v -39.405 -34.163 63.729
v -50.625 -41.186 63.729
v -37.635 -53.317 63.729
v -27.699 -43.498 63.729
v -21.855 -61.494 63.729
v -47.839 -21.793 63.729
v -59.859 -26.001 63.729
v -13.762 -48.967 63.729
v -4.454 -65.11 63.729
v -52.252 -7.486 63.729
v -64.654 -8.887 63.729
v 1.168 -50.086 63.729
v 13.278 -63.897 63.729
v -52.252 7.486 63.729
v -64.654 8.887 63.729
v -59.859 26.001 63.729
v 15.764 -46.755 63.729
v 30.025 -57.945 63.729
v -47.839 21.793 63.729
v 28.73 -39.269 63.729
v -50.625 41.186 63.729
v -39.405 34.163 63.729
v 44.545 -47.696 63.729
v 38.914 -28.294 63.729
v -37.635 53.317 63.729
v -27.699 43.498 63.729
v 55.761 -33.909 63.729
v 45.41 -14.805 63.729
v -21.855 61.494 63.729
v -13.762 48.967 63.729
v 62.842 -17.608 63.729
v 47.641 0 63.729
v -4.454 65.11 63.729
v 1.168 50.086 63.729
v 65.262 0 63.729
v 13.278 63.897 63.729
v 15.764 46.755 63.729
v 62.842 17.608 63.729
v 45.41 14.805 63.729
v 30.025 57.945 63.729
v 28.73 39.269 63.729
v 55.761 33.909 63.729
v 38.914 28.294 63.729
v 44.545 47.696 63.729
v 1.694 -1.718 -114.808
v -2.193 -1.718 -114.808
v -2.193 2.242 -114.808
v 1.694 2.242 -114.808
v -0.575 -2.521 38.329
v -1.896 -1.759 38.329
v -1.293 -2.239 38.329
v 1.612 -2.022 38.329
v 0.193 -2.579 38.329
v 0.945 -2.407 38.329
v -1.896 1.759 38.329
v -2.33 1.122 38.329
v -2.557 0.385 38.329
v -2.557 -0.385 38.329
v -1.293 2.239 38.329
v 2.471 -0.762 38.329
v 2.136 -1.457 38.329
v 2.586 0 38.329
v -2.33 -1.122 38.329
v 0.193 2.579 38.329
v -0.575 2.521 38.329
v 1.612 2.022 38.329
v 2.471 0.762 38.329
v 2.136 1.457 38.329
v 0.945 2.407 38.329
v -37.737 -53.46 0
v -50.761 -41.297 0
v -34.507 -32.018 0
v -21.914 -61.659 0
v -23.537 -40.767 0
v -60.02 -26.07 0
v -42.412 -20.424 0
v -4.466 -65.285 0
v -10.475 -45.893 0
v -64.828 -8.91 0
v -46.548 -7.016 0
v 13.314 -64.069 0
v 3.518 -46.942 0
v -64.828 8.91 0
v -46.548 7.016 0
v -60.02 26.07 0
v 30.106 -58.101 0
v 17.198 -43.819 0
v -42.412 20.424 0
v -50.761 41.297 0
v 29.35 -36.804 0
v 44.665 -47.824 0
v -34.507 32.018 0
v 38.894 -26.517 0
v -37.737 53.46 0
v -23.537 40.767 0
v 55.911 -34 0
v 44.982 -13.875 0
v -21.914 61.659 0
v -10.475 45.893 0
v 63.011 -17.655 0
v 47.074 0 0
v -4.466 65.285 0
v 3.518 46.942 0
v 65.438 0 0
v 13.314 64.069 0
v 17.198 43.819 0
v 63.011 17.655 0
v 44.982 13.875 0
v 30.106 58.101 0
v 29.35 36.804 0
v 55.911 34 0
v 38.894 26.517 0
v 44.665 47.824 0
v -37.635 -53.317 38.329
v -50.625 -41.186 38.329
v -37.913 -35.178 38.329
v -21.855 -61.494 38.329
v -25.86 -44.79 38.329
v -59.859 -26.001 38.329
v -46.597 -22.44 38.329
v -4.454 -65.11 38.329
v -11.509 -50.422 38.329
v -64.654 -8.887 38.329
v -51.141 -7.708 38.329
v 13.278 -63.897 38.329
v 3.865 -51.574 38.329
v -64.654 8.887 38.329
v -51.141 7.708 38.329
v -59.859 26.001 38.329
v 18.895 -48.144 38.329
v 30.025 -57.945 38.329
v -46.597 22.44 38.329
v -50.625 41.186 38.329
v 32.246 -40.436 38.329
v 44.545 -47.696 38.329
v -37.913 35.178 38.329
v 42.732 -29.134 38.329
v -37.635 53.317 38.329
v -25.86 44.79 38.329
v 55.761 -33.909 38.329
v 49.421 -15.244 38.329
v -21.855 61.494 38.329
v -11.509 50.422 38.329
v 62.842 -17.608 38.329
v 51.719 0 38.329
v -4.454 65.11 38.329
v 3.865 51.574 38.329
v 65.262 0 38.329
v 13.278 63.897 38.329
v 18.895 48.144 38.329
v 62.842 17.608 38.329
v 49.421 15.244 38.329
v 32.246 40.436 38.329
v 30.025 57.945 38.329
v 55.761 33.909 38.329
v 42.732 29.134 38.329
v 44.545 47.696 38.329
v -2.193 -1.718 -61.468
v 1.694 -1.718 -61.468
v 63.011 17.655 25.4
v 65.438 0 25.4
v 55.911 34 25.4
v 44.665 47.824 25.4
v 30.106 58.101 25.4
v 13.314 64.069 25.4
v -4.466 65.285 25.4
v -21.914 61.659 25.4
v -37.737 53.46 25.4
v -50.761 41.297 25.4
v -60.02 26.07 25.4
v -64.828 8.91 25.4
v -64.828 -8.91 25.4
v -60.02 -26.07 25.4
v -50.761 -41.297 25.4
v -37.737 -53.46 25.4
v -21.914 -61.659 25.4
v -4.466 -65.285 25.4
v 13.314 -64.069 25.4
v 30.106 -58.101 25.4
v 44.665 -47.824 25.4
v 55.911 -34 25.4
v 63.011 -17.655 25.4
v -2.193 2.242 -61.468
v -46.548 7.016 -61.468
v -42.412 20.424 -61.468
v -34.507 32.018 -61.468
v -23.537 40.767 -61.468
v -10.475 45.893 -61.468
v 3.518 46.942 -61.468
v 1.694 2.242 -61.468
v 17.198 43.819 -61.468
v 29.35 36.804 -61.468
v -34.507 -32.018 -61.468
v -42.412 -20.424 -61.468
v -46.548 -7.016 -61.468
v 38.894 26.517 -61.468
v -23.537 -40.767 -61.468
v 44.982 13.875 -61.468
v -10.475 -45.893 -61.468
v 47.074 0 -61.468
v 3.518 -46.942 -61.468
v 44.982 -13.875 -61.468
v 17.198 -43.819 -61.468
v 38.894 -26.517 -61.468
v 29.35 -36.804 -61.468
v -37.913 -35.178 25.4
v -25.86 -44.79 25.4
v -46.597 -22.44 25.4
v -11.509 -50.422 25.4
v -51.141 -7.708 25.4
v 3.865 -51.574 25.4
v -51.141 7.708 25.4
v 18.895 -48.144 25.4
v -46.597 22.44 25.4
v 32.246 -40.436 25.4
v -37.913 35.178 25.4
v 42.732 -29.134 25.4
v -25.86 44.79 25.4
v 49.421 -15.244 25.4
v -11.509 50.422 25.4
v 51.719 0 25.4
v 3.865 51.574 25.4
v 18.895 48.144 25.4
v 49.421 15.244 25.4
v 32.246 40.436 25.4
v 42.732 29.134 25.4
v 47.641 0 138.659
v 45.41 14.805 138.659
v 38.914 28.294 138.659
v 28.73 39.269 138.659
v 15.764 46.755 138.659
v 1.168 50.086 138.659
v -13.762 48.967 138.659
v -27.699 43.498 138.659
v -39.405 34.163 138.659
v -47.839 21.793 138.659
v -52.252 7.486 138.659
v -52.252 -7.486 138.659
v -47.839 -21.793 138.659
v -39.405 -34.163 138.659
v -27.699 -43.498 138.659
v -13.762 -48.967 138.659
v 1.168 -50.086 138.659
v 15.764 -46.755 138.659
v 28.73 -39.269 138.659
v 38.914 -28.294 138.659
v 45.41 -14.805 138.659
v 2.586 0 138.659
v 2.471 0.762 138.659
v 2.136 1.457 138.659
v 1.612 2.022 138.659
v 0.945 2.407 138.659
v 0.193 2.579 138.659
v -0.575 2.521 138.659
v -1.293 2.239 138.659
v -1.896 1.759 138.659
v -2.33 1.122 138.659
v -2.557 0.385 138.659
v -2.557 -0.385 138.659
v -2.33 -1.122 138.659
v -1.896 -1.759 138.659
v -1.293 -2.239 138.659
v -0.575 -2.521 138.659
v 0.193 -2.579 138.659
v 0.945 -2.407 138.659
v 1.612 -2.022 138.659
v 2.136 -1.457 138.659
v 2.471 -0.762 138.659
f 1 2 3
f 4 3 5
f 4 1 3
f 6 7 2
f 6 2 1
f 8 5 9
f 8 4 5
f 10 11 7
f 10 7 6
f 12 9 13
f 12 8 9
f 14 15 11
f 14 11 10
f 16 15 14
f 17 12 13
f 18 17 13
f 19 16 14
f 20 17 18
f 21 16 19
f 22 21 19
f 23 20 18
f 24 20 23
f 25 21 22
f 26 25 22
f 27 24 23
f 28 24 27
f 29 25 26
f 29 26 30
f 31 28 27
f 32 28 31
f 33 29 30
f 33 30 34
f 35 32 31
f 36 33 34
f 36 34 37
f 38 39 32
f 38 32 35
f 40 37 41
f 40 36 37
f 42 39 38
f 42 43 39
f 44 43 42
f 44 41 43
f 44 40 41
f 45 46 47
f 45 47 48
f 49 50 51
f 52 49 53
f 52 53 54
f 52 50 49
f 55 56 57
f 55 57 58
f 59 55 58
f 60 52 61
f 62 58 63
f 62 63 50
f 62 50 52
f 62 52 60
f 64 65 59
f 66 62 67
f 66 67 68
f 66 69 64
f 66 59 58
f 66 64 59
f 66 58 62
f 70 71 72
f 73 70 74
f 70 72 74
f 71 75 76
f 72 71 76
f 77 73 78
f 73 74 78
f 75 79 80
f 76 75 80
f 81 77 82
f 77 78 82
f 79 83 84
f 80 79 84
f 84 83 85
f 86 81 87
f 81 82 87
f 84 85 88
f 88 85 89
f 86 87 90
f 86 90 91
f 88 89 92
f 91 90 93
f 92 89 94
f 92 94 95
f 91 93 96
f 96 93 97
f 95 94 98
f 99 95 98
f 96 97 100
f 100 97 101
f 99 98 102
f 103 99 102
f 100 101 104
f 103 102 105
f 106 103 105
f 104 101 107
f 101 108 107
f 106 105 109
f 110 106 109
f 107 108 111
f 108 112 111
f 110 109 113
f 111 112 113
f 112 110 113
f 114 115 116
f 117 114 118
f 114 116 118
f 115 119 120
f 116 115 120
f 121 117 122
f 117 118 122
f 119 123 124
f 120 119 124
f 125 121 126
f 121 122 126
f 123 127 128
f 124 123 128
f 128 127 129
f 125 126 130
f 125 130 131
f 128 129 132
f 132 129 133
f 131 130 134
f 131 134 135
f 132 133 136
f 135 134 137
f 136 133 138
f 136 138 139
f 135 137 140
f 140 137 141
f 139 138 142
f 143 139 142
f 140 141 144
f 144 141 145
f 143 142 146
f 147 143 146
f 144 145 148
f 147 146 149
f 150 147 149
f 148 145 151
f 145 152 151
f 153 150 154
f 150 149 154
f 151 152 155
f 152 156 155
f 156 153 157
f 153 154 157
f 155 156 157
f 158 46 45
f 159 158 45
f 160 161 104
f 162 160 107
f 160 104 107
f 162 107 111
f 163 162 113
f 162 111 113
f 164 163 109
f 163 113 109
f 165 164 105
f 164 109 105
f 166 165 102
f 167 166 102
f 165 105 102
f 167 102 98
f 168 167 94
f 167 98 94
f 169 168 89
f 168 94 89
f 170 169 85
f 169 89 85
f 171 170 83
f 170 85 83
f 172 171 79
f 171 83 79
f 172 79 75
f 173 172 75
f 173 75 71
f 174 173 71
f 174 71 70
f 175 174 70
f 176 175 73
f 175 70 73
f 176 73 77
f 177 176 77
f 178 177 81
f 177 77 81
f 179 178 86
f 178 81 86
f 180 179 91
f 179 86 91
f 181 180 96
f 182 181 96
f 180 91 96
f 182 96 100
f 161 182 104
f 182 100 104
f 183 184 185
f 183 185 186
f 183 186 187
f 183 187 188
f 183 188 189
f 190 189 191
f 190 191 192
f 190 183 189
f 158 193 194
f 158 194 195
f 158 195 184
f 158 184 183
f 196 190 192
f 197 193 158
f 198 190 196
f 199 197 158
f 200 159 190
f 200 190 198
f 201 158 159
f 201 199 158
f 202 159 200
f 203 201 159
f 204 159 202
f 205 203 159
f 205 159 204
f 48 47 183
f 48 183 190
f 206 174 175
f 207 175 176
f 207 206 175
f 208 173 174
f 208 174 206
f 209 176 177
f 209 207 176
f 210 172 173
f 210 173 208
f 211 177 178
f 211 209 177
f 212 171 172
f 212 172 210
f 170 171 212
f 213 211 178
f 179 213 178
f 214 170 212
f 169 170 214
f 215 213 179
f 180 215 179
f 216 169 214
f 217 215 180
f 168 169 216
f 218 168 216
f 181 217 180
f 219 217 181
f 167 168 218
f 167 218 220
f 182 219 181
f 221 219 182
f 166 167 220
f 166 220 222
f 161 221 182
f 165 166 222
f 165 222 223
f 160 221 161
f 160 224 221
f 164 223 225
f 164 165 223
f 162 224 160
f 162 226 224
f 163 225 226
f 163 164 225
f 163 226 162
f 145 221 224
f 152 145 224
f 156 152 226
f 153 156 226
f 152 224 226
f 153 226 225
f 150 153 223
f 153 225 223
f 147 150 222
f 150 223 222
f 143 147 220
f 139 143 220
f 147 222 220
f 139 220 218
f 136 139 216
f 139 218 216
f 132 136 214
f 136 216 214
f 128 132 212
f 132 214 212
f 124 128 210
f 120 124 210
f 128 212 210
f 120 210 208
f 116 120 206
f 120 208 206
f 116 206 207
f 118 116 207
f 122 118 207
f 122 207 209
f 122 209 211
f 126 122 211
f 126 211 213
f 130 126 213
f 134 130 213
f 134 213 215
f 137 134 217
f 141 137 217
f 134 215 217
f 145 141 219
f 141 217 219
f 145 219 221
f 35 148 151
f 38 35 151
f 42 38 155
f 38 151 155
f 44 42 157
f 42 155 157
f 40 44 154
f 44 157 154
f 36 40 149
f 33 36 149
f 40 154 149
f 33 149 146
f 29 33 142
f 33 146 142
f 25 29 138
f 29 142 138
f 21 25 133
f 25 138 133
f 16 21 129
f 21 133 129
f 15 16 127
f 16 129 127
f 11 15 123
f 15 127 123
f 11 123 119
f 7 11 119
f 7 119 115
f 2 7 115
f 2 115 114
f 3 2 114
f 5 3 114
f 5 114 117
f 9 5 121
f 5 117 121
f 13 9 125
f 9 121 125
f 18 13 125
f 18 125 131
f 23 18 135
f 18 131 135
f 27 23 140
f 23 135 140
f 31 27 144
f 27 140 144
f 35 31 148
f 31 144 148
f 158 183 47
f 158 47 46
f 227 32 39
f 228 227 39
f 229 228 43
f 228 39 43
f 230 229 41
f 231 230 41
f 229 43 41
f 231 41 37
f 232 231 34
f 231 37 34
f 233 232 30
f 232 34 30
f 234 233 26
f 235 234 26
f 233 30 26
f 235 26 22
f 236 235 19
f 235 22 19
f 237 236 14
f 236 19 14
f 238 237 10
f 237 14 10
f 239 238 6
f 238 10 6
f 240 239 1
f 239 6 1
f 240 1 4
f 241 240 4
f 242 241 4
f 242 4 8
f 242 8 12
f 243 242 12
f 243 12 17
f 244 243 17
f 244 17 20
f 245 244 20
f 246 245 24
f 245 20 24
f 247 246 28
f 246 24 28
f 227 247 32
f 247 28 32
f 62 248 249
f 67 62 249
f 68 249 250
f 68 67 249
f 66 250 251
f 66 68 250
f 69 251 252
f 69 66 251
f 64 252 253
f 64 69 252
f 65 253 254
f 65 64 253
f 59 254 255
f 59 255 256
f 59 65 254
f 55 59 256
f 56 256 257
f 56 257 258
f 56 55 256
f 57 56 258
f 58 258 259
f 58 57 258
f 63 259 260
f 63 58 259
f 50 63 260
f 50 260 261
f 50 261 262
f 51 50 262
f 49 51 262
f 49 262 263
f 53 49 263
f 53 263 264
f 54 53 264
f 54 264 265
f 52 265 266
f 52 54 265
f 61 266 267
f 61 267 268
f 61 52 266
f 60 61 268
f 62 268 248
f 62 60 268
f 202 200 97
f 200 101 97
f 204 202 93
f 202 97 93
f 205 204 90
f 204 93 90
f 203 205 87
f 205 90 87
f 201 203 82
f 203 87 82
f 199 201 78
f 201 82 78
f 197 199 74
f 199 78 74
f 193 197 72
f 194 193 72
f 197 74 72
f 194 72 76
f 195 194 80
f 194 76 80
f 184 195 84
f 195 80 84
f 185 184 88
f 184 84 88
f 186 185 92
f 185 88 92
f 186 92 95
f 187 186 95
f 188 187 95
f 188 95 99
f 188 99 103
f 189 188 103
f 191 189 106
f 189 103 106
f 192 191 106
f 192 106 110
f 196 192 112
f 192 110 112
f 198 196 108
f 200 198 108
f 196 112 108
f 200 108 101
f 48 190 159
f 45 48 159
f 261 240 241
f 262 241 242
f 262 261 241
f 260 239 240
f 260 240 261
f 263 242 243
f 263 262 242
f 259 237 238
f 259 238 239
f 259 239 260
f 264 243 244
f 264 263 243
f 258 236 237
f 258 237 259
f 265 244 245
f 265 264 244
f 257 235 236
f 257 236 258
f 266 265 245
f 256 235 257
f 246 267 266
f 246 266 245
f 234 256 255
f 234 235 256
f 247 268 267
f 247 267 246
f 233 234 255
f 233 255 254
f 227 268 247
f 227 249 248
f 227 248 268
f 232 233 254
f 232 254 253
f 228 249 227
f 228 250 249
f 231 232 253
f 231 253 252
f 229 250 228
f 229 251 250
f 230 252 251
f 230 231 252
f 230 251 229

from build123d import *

# Parameters (mm, degrees)
F0_R      = 65.437534
F1_DEPTH  = 25.4
F2_R      = 51.719022
F3_DEPTH  = 12.929184
F4_R      = 51.719022
F4_R_2    = 2.585787
F4_R_3    = 65.262229
F5_DEPTH  = 25.4
F6_R      = 47.073504
F7_DEPTH  = 61.468
F8_R      = 50.226774
F8_R_2    = 2.585787
F9_DEPTH  = 74.93
F11_W     = 9.235289
F11_H     = 11.885514
F10_R     = 47.073504
F12_DEPTH = 1.524
F13_W     = 3.887014
F13_H     = 3.9601
F14_DEPTH = 53.34


with BuildPart() as f1:
    # F0 (on Top) → F1 (new body)
    with BuildSketch(Plane.XY):
        Circle(F0_R)
    extrude(amount=F1_DEPTH)

    # F2 (on face) → F3 (join)
    with BuildSketch(Plane.XY.offset(25.4)):
        Circle(F2_R)
    extrude(amount=F3_DEPTH)

    # F4 (on face) → F5 (join)
    with BuildSketch(Plane.XY.offset(38.329184)):
        Circle(F4_R)
        Circle(F4_R_2, mode=Mode.SUBTRACT)
        Circle(F4_R_3)
        Circle(F4_R_2, mode=Mode.SUBTRACT)
    extrude(amount=F5_DEPTH)

    # F6 (on face) → F7 (join)
    with BuildSketch(Plane(origin=(0, 0, 0), x_dir=(1, 0, 0), z_dir=(0, 0, -1))):
        Circle(F6_R)
    extrude(amount=F7_DEPTH)

    # F8 (on face) → F9 (join)
    with BuildSketch(Plane.XY.offset(63.729184)):
        with Locations((-2.585787, 0)):
            Circle(F8_R)
        Circle(F8_R_2, mode=Mode.SUBTRACT)
    extrude(amount=F9_DEPTH)

    # F11 (on face) + F10 (on face) → F12 (join)
    with BuildSketch(Plane(origin=(0, 0, -61.468), x_dir=(1, 0, 0), z_dir=(0, 0, -1))):
        with Locations((0.111258, -0.588183)):
            Rectangle(F11_W, F11_H)
    with BuildSketch(Plane(origin=(0, 0, -61.468), x_dir=(1, 0, 0), z_dir=(0, 0, -1))):
        Circle(F10_R)
    extrude(amount=-F12_DEPTH)

    # F13 (on face) → F14 (join)
    with BuildSketch(Plane(origin=(0, 0, -61.468), x_dir=(1, 0, 0), z_dir=(0, 0, -1))):
        with Locations((-0.249897, -0.261744)):
            Rectangle(F13_W, F13_H)
    extrude(amount=F14_DEPTH)


solid = f1.part
